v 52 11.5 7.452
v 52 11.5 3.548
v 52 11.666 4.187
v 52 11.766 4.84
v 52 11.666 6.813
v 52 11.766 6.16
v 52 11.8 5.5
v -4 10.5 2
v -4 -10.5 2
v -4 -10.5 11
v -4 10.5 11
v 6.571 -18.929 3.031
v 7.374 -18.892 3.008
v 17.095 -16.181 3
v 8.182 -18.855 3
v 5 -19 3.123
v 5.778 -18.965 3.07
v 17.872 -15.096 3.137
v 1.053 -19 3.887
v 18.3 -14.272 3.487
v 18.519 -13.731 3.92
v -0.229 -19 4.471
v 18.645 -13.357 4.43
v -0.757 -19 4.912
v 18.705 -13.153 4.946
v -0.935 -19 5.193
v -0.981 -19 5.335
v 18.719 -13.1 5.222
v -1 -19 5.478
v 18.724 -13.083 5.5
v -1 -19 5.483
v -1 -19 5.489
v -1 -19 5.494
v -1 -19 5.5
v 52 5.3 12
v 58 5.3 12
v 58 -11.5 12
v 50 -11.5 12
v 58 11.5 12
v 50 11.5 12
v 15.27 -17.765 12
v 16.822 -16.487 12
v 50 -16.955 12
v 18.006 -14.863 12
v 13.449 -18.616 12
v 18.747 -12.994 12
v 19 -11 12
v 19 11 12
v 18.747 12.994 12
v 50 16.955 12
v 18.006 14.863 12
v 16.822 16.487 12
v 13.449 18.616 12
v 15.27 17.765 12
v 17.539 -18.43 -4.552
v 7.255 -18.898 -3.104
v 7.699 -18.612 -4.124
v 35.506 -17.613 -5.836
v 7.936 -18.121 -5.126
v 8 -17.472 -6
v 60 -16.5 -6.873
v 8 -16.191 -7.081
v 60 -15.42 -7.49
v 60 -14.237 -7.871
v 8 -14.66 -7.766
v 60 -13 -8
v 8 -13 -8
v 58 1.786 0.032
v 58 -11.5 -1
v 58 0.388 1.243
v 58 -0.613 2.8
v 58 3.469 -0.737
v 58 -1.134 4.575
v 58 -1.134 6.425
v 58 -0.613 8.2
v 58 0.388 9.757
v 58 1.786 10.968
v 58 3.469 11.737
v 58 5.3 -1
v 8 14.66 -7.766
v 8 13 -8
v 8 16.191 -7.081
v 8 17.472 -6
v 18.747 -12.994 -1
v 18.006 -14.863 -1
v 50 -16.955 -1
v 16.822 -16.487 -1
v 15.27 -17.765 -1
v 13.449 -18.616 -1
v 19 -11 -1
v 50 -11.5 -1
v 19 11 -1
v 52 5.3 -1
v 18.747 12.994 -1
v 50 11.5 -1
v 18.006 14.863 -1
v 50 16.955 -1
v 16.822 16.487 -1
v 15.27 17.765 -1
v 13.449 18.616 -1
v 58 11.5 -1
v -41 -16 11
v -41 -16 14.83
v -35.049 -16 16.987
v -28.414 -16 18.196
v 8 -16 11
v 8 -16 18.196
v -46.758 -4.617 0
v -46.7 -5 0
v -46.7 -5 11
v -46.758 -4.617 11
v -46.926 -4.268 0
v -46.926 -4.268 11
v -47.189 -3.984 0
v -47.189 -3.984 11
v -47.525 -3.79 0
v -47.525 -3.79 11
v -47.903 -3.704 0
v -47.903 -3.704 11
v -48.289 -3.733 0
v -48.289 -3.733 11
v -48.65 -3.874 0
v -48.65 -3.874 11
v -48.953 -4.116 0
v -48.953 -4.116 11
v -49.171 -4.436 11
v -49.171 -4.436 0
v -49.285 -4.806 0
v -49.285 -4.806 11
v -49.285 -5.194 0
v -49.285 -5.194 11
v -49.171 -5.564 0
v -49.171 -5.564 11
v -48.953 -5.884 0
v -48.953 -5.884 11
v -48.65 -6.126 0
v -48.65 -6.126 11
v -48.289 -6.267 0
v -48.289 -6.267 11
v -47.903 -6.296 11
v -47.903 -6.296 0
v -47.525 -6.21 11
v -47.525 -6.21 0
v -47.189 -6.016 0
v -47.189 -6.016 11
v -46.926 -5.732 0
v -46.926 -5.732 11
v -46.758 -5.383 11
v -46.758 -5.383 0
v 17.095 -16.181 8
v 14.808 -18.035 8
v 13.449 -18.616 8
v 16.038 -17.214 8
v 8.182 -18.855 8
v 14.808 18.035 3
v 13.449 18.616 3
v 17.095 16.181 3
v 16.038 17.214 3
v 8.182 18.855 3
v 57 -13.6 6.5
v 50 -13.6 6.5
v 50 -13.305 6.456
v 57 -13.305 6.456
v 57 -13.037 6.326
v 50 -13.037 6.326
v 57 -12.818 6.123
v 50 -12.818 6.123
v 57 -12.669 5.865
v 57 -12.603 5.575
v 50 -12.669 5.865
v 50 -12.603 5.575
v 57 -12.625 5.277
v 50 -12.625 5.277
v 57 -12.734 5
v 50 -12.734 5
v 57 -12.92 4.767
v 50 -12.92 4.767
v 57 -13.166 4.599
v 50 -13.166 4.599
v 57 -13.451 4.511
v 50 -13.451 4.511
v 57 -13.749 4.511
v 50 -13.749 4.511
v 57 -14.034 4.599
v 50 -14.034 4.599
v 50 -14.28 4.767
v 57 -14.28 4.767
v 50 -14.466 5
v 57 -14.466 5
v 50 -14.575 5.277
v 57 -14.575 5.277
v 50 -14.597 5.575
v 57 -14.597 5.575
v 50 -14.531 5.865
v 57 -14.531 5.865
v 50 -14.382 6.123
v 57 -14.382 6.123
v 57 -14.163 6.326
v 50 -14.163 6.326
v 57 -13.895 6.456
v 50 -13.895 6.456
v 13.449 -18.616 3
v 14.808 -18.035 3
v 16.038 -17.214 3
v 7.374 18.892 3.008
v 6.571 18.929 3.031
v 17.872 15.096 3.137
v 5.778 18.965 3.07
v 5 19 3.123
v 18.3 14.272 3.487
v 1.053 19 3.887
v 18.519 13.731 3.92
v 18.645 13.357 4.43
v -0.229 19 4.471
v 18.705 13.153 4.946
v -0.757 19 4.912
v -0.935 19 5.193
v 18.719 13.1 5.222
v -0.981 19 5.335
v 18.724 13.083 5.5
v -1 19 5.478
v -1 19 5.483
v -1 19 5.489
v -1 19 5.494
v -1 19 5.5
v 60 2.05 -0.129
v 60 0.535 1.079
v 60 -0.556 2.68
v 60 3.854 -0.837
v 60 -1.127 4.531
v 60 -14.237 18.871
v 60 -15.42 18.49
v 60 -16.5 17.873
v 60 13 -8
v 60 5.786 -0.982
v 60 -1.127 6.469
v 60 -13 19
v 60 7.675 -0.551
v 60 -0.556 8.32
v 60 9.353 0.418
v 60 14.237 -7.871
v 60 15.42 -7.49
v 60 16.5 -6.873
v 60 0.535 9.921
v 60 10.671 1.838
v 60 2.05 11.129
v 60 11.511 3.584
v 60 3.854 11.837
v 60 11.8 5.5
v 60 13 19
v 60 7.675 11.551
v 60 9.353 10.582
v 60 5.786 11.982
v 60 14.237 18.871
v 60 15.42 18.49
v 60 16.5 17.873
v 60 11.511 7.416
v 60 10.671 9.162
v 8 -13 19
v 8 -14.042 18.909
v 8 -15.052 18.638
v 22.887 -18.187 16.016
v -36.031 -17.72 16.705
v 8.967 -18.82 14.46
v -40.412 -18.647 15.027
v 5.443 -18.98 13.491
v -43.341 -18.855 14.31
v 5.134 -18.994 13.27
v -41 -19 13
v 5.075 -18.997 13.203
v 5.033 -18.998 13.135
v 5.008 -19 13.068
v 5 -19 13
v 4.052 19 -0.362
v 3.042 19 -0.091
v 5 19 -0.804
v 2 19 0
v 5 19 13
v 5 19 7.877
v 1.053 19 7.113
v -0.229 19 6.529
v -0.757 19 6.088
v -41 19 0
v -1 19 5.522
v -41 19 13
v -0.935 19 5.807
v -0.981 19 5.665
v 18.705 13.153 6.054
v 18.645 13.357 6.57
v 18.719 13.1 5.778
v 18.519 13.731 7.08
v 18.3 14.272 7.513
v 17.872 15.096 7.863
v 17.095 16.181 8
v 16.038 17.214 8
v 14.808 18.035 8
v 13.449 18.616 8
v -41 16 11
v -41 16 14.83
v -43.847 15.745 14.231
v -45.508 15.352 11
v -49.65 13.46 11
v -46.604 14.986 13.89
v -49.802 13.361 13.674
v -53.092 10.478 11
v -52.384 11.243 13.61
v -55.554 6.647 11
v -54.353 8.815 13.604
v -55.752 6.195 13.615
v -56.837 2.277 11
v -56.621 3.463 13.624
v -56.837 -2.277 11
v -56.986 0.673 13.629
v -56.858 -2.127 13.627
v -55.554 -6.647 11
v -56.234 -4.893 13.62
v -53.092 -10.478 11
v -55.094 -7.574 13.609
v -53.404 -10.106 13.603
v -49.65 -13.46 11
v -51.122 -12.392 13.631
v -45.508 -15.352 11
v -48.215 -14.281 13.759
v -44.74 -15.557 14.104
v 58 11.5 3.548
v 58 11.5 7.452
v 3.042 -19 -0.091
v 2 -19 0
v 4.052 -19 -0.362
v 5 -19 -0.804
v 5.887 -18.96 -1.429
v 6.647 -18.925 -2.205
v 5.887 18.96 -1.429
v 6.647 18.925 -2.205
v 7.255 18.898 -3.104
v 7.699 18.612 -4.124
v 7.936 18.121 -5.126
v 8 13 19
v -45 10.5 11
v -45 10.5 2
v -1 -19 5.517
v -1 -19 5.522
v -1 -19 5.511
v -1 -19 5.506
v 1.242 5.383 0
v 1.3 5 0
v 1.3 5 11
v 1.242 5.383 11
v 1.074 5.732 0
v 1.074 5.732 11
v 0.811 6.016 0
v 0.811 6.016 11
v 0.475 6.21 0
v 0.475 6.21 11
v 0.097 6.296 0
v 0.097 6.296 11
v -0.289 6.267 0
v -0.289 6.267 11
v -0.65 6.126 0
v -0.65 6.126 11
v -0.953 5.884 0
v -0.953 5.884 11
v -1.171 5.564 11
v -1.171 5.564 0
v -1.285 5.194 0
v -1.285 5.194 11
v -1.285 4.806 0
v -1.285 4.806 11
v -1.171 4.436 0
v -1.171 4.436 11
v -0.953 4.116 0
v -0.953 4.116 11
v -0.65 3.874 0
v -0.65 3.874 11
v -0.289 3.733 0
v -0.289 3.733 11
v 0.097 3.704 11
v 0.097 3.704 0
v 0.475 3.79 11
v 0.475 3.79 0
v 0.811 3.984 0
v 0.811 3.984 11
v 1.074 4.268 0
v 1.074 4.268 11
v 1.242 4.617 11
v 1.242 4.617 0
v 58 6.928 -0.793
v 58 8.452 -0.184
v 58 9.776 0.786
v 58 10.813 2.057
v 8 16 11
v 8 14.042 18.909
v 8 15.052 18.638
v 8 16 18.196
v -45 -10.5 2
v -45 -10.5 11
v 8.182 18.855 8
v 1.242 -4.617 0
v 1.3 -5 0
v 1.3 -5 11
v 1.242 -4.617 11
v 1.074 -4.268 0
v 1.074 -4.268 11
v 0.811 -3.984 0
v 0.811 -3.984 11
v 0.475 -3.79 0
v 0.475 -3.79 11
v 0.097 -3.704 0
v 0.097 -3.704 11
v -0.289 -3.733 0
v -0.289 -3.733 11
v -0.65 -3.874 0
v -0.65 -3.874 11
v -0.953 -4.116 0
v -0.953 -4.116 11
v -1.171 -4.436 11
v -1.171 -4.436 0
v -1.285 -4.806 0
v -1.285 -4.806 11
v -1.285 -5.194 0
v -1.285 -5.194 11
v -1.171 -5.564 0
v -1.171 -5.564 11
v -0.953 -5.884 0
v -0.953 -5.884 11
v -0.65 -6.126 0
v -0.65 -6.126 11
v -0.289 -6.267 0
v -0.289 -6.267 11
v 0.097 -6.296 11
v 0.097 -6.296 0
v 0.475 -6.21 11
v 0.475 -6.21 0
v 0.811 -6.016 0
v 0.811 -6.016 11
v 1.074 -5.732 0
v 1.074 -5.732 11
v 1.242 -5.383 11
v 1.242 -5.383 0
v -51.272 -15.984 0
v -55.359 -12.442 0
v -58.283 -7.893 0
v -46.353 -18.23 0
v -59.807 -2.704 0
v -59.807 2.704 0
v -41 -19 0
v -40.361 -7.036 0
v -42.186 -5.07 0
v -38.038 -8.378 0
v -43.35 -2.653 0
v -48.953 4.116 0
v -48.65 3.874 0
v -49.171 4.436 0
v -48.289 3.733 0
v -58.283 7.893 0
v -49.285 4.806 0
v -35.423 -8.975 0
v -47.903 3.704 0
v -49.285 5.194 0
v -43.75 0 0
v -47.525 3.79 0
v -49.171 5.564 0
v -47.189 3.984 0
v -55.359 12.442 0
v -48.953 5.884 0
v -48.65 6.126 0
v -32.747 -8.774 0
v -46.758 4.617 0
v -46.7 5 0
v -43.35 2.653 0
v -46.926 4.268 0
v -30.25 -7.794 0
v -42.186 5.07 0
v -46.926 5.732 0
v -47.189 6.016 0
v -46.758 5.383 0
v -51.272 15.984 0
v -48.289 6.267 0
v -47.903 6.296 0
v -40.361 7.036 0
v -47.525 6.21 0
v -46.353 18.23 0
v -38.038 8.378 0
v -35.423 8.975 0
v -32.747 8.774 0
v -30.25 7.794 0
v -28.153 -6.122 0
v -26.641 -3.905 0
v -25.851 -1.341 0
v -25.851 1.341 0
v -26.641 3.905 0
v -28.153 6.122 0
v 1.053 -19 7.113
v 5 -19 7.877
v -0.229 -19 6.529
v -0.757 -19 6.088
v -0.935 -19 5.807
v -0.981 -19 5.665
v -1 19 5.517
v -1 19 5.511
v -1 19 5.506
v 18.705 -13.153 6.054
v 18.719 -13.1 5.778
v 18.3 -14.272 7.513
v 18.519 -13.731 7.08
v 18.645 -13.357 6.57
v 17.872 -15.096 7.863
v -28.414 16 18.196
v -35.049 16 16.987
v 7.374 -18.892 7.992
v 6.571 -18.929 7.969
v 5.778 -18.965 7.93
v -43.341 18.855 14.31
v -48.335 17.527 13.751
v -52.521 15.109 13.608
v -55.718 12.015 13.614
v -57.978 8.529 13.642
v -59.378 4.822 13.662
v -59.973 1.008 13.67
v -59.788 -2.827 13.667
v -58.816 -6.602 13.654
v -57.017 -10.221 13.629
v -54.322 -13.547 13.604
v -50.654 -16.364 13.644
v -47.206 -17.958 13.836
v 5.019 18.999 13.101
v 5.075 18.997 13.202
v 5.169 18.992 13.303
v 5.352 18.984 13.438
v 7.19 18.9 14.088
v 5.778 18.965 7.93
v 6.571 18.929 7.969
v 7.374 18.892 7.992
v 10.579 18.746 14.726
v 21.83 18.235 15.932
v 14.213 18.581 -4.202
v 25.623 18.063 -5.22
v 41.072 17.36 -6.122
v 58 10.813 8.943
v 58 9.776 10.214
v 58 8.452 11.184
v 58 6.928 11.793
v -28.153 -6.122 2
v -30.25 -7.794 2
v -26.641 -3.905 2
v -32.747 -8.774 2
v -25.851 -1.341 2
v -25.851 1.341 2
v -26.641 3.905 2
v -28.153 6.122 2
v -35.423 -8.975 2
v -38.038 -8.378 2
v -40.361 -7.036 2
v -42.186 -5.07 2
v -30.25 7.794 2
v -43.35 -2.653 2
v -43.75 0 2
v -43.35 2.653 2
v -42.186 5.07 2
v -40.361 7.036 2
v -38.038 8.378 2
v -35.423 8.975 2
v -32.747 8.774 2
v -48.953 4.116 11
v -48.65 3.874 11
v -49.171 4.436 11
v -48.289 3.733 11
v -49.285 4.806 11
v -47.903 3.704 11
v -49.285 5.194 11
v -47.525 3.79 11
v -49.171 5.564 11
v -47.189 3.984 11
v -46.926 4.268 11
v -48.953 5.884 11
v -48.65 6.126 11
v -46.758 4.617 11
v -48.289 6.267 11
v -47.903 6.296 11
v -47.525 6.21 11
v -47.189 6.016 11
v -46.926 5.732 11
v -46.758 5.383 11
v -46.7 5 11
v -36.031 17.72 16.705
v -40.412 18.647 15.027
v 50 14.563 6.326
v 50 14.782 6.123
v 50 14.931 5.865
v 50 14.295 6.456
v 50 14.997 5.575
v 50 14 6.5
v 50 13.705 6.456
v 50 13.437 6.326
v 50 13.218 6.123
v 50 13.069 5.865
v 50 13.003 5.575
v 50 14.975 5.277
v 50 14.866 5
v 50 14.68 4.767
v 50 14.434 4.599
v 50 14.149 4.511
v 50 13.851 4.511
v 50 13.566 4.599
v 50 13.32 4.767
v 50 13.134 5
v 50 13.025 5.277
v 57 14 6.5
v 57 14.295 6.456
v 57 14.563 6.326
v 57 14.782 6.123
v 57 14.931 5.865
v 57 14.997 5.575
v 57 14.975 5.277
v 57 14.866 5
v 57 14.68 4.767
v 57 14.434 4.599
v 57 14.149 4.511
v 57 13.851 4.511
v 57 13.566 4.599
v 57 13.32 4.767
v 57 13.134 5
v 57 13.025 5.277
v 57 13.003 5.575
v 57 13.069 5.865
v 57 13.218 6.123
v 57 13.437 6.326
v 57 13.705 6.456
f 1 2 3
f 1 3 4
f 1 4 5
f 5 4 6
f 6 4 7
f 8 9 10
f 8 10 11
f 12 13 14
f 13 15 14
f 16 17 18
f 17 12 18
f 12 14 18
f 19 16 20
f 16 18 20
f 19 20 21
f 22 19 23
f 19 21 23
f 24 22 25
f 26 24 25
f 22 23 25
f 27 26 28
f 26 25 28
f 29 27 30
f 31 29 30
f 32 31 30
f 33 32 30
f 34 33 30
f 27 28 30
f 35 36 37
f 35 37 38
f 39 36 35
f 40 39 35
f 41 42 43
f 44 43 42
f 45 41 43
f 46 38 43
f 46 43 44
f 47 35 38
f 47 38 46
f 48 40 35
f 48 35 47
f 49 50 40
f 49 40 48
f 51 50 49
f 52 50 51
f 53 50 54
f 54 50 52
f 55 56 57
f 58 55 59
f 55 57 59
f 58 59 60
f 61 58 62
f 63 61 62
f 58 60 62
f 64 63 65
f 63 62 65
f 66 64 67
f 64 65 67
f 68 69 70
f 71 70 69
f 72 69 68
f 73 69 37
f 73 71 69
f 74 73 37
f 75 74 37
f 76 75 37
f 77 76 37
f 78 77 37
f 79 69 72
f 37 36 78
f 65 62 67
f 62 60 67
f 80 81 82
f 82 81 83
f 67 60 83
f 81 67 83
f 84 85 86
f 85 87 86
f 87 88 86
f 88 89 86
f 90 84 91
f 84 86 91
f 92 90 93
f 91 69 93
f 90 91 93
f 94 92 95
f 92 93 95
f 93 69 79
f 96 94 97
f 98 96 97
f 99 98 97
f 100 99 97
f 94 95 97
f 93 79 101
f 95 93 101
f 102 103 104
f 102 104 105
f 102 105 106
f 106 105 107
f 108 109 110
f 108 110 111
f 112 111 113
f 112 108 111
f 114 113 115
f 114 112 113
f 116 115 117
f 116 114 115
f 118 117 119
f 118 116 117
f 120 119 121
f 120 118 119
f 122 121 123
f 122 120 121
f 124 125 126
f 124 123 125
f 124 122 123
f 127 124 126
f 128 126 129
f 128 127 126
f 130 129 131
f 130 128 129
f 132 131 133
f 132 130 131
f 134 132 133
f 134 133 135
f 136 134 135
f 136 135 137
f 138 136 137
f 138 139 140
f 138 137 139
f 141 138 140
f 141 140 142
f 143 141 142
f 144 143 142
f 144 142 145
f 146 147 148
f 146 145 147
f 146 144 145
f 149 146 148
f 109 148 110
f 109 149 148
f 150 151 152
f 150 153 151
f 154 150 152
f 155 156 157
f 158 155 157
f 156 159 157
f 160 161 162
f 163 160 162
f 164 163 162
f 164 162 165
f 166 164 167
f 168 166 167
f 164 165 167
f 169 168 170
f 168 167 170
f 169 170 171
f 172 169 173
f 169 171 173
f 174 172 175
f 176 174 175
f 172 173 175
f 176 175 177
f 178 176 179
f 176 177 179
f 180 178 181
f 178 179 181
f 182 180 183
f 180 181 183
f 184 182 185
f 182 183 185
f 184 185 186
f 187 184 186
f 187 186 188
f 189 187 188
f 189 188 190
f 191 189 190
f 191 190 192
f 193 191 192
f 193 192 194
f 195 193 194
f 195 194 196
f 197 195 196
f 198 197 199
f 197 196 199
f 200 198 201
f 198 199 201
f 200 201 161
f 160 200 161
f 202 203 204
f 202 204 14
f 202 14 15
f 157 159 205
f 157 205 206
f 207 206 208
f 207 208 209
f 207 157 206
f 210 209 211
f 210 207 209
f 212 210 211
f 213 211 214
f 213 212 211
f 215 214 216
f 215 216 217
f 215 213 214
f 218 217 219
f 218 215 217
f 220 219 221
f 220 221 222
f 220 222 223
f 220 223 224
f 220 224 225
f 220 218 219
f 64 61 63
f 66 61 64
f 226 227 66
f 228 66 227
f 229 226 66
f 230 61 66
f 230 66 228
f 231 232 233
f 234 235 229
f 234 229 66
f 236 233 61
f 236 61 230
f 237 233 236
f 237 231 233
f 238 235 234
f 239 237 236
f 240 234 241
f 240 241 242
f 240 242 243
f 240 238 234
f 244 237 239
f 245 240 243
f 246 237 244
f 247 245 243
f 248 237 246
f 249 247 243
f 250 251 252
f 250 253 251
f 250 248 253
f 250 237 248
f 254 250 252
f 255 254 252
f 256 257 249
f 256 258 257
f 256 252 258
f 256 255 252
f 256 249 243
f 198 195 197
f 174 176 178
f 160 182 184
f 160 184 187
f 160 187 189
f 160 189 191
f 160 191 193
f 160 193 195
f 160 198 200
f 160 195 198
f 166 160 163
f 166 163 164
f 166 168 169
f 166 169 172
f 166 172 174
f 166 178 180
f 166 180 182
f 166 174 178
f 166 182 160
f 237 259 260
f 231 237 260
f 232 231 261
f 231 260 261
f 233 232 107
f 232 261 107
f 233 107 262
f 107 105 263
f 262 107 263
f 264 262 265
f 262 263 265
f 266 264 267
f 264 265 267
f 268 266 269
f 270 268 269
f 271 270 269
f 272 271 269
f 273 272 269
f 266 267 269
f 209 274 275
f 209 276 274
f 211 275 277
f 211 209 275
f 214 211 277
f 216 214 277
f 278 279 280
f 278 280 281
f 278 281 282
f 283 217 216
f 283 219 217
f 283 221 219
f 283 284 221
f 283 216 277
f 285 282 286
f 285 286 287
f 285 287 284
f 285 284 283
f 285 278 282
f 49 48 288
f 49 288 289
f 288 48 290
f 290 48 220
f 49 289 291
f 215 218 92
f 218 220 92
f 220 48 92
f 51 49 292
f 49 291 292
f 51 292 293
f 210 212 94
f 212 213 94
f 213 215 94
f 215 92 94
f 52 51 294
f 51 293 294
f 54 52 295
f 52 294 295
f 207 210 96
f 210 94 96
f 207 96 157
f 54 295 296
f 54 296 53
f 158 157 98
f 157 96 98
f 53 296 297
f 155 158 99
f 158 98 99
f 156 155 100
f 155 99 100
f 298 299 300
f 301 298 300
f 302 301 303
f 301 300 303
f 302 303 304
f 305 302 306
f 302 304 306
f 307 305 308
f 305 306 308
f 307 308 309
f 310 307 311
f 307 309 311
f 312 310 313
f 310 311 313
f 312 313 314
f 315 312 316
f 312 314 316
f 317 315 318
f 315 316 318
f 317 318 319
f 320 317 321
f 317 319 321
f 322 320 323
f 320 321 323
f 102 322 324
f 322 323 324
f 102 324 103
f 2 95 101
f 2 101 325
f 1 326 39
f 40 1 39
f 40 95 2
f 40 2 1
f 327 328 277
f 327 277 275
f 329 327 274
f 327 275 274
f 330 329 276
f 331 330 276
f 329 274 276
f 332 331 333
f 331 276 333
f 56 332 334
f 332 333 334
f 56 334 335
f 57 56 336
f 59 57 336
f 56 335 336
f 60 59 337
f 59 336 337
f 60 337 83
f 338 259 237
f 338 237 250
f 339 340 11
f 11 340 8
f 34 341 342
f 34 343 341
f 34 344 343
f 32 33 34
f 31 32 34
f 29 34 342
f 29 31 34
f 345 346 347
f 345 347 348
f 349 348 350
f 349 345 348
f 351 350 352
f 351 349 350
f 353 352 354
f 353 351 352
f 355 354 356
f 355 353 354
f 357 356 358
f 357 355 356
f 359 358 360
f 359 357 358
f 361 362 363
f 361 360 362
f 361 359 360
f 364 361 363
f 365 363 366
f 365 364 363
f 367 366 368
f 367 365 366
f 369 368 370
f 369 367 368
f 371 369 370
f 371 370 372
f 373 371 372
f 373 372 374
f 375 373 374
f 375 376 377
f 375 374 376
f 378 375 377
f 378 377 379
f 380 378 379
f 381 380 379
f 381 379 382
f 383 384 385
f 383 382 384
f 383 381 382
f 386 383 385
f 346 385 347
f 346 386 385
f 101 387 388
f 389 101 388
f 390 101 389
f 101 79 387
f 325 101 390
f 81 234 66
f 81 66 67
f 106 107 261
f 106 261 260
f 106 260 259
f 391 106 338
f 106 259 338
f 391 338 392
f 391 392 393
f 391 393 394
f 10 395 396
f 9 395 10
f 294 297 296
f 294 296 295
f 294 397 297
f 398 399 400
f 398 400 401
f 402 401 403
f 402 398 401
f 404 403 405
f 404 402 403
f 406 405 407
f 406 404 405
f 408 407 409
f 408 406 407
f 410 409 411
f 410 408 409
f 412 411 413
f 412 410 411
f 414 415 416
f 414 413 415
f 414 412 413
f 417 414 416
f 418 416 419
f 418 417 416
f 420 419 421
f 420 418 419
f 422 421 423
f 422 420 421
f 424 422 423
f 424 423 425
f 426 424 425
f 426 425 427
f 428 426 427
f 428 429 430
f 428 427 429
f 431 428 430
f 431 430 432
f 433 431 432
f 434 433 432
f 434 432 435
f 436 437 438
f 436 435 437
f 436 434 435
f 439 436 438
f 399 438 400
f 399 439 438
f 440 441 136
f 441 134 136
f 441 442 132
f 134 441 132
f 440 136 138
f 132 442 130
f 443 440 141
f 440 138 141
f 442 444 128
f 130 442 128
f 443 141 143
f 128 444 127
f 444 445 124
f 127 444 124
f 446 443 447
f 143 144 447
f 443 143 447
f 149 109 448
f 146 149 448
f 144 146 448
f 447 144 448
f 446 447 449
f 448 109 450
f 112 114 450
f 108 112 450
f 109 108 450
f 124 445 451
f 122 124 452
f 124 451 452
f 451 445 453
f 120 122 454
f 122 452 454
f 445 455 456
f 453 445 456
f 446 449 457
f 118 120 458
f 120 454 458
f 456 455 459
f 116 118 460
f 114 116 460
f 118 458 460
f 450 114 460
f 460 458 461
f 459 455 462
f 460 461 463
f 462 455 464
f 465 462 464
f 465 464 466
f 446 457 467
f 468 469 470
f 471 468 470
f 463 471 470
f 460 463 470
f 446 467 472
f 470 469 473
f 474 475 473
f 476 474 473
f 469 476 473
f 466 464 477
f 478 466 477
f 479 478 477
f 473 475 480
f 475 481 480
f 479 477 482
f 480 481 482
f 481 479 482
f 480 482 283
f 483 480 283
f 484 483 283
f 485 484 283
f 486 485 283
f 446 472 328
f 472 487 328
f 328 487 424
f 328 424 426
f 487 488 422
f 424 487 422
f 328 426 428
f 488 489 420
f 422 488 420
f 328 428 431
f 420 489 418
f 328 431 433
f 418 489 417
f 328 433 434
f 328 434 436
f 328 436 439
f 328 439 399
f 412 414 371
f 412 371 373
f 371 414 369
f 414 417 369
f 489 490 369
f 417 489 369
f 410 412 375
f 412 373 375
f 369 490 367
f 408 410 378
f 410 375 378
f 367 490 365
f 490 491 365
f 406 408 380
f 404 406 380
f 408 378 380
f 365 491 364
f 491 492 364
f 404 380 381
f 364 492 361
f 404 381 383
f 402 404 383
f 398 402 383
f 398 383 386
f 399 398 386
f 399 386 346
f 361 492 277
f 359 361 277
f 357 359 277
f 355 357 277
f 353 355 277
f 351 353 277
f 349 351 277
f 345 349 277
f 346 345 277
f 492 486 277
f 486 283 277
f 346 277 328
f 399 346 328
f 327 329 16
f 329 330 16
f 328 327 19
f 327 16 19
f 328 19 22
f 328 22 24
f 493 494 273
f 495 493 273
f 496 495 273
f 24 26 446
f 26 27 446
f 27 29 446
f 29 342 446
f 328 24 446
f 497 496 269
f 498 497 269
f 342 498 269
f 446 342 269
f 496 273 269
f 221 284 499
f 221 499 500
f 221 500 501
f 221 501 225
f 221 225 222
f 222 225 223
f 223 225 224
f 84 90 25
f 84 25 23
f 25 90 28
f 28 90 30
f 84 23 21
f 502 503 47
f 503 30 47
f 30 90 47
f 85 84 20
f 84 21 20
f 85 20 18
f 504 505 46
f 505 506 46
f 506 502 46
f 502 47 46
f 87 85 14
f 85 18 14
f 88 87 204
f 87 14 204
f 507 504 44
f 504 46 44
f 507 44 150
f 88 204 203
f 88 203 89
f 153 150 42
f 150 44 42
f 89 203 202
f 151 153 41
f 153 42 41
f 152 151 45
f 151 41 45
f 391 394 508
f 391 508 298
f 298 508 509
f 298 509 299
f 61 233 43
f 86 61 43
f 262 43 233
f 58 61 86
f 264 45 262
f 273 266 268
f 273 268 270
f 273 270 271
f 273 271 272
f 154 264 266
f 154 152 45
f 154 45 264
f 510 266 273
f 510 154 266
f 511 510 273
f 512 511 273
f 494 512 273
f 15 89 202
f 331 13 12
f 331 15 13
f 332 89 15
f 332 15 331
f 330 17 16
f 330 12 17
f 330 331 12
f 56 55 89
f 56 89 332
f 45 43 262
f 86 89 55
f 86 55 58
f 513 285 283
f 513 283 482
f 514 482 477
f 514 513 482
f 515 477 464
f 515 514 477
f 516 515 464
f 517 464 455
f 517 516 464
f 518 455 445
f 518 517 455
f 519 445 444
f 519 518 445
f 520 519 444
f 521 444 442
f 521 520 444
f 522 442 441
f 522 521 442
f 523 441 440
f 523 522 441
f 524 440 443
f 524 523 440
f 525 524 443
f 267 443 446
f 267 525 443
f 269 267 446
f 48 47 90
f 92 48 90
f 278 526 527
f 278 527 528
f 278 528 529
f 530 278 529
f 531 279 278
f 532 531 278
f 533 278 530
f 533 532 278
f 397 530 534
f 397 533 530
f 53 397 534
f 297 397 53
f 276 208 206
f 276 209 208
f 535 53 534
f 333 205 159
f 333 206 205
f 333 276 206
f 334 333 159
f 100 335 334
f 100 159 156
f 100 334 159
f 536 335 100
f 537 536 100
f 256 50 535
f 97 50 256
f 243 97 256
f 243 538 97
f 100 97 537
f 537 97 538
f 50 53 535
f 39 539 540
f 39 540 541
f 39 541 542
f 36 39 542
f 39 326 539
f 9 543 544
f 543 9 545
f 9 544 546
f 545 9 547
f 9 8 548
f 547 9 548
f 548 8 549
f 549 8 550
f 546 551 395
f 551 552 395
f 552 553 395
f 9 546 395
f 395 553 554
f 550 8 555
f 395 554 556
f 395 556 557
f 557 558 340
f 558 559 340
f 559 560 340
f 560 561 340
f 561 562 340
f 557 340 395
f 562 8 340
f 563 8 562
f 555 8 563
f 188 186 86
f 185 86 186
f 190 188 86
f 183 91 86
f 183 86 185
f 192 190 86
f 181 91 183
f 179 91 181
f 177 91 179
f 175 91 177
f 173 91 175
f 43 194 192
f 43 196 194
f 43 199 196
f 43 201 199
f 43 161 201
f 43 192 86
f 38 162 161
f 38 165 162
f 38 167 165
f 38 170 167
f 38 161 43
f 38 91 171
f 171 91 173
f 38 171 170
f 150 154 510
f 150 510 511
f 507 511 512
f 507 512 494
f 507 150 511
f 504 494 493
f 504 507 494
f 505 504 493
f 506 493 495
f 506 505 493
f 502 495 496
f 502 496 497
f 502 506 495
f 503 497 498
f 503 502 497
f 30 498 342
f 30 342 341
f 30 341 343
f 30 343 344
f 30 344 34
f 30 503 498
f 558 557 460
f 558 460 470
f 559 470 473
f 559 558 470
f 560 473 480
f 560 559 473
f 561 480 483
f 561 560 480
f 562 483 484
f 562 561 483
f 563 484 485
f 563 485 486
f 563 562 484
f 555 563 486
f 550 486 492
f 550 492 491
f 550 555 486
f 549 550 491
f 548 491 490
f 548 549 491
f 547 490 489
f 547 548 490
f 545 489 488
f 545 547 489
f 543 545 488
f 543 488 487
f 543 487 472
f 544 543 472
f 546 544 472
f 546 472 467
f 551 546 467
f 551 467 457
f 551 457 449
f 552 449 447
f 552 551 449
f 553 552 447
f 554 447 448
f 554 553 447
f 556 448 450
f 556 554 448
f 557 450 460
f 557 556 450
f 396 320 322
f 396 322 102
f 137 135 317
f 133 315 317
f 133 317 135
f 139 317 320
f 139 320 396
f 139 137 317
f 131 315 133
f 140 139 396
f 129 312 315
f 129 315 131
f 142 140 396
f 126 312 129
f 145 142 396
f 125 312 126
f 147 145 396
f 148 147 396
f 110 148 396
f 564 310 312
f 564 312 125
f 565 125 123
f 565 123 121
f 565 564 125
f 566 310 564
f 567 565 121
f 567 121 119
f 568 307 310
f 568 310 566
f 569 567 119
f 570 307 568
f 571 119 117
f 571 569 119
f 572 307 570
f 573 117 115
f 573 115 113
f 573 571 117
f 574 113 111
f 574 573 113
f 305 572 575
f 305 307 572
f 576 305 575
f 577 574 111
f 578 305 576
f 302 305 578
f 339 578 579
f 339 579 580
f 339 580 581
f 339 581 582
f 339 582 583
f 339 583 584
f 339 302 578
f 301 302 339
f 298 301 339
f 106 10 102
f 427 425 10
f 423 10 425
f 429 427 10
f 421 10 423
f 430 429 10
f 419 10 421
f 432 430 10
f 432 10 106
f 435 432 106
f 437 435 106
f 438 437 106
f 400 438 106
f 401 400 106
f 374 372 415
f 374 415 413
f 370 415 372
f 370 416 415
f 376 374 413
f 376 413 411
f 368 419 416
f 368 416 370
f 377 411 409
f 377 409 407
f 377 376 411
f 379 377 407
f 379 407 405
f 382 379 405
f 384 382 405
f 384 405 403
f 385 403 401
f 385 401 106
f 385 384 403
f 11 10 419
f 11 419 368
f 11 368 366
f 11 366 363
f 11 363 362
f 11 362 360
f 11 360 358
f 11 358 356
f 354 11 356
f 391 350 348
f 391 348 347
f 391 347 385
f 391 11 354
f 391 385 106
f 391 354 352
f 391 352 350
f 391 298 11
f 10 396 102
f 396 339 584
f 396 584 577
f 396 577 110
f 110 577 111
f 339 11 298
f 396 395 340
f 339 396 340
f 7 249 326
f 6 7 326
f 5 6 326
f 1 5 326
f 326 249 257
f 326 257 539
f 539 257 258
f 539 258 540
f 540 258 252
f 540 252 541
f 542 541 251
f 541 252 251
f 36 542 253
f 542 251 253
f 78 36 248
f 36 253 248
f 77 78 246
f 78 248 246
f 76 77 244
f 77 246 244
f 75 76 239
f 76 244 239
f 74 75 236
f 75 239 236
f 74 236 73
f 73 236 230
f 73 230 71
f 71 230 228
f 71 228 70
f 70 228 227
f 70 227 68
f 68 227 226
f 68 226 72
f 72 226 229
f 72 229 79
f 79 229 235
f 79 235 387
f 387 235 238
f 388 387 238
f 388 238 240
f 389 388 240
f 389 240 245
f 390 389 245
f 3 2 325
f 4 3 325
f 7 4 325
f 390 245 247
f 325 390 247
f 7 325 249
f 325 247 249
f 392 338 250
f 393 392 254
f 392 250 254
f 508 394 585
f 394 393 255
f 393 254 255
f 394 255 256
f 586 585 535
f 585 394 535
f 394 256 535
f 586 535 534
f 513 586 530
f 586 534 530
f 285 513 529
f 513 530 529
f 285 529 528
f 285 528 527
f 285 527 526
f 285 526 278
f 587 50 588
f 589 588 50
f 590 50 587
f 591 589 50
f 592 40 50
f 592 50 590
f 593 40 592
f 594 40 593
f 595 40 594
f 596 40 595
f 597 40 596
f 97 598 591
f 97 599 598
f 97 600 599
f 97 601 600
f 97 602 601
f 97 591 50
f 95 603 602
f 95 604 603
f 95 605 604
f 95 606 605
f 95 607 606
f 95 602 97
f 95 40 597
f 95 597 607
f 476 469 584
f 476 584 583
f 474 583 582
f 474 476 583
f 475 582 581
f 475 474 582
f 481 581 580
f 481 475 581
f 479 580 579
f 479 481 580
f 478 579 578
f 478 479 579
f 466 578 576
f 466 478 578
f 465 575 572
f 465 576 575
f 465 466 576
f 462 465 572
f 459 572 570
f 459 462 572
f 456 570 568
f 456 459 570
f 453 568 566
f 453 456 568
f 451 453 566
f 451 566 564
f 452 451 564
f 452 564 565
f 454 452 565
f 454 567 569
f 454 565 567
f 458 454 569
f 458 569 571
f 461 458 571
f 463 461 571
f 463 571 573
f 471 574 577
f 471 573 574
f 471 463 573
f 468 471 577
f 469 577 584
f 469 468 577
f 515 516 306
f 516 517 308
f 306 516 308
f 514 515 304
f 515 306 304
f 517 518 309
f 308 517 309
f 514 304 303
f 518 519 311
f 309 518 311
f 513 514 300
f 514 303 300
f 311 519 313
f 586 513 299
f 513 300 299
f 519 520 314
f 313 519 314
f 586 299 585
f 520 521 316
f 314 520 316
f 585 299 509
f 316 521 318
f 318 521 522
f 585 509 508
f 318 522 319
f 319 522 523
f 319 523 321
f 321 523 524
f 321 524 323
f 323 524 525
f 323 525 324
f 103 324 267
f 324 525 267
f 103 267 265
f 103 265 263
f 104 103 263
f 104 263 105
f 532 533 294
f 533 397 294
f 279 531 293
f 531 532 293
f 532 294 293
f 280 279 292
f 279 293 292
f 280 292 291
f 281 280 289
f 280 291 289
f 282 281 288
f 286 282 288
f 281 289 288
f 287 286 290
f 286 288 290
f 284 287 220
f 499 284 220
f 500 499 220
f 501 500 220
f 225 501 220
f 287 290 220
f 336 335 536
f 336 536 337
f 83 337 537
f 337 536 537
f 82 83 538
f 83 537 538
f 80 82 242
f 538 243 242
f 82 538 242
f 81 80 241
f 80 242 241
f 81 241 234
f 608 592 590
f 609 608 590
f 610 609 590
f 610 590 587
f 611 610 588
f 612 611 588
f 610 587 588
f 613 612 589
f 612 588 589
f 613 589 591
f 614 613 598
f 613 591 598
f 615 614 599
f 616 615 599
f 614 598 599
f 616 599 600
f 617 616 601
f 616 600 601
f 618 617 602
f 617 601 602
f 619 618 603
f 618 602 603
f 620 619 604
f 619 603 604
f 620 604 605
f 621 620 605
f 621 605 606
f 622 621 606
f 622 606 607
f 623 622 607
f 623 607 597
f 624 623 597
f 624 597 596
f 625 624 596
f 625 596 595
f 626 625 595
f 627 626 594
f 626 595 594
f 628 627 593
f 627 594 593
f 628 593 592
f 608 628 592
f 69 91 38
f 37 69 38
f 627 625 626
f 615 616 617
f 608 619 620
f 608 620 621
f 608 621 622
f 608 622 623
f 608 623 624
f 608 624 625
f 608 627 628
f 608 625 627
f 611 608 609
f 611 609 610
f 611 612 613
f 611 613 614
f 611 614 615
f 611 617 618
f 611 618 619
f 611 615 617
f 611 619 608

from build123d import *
from OCP.BRepFilletAPI import BRepFilletAPI_MakeChamfer

# Parameters (mm, degrees)
SKETCH1_W               = 120
SKETCH1_H               = 38
SKETCH1_W_2             = 41
SKETCH1_H_2             = 21
BOSS_EXTRUDE1_DEPTH     = 11
SKETCH2_R               = 1.3
CUT_EXTRUDE1_DEPTH      = 8
FILLET1_RADIUS          = 19
FILLET1_LENGTH          = 11
BOSS_EXTRUDE2_START     = 8
BOSS_EXTRUDE2_DEPTH     = 8
FILLET2_R               = 16
CUT_EXTRUDE2_DEPTH      = 66.741919656
CUT_EXTRUDE2_DEPTH_BACK = 66.741919656
BOSS_EXTRUDE3_START     = 8
BOSS_EXTRUDE3_OUTLINE_W = 32
BOSS_EXTRUDE3_OUTLINE_H = 8
BOSS_EXTRUDE3_DEPTH     = 49
SKETCH6_W               = 52
SKETCH6_H               = 38
BOSS_EXTRUDE4_DEPTH     = 8
CUT_EXTRUDE3_DEPTH      = 74.518705262
CUT_EXTRUDE3_DEPTH_BACK = 74.518705262
SKETCH7_W               = 31
SKETCH7_H               = 13
SKETCH8_W               = 13
SKETCH8_H               = 23
CUT_EXTRUDE4_DEPTH      = 8
BOSS_EXTRUDE5_START     = -2
SKETCH9_R               = 9
BOSS_EXTRUDE5_DEPTH     = 2
SKETCH10_R              = 6.5
CUT_EXTRUDE5_DEPTH      = 8
SKETCH12_W              = 5
SKETCH12_H              = 6
CUT_EXTRUDE6_DEPTH      = 20
CHAMFER1_SIZE           = 6
CHAMFER1_SIZE_2         = 20
FILLET3_R               = 8
FILLET4_R               = 6
FILLET5_R               = 6
FILLET6_R               = 2.5
SKETCH13_R              = 1.1
CUT_EXTRUDE7_DEPTH      = 8
CUT_EXTRUDE8_DEPTH      = 69.483574828
CUT_EXTRUDE8_DEPTH_BACK = 69.483574828
CUT_EXTRUDE9_DEPTH      = 66.741919805
CUT_EXTRUDE9_DEPTH_BACK = 66.741919805
SKETCH15_R              = 1.3
SKETCH16_R              = 1.1
BOSS_EXTRUDE6_DEPTH     = 8
SKETCH17_R              = 1
CUT_EXTRUDE10_DEPTH     = 7


# Read off the part's stored shape, not the designer's step: Boss-Extrude3
# Some blends are built 0.0001 mm under size
with BuildPart() as part:
    # Sketch1 → Boss-Extrude1 (new body)
    with BuildSketch(Plane.XY):
        Rectangle(SKETCH1_W, SKETCH1_H)
        with Locations((-24.5, 0)):
            Rectangle(SKETCH1_W_2, SKETCH1_H_2, mode=Mode.SUBTRACT)
    extrude(amount=BOSS_EXTRUDE1_DEPTH)

    # Sketch2 → Cut-Extrude1 (cut)
    with BuildSketch(Plane.XY.offset(1)):
        with Locations((0, 5)):
            Circle(SKETCH2_R)
        with Locations((-48, 5)):
            Circle(SKETCH2_R)
        with Locations((-48, -5)):
            Circle(SKETCH2_R)
        with Locations((0, -5)):
            Circle(SKETCH2_R)
    extrude(amount=CUT_EXTRUDE1_DEPTH, mode=Mode.SUBTRACT)

    # Fillet1: full round fillet: the end face becomes a half cylinder, R = half its width
    fillet1_face = Plane((-60, 0, 5.5), x_dir=(0, 0, 1), z_dir=(-1, 0, 0))  # on the end face: x along it, z out of the body
    fillet1_slab = fillet1_face.offset(-FILLET1_RADIUS / 2) * Box(FILLET1_LENGTH, 2 * FILLET1_RADIUS, FILLET1_RADIUS, mode=Mode.PRIVATE)  # the body's end, R deep
    fillet1_round = Plane((-41, 0, 5.5), x_dir=(-1, 0, 0), z_dir=(0, 0, 1)) * Cylinder(FILLET1_RADIUS, FILLET1_LENGTH, mode=Mode.PRIVATE)  # its axis R under the face
    add(fillet1_slab - fillet1_round, mode=Mode.SUBTRACT)

    # Sketch3 → Boss-Extrude2 (add)
    with BuildSketch(Plane.XY.offset(11).offset(BOSS_EXTRUDE2_START)):
        with BuildLine():
            Line((60, 19), (-41, 19))
            ThreePointArc((-41, 19), (-60, 0), (-41, -19))
            Line((-41, -19), (60, -19))
            Line((60, -19), (60, 19))
        make_face()
        with BuildLine():
            Line((57, 16), (-41, 16))
            ThreePointArc((-41, 16), (-57, 0), (-41, -16))
            Line((-41, -16), (57, -16))
            Line((57, -16), (57, 16))
        make_face(mode=Mode.SUBTRACT)
    extrude(amount=-BOSS_EXTRUDE2_DEPTH)

    # Fillet2
    fillet2_edges = [part.edges().sort_by_distance(p)[0] for p in [
        (57, 16, 15),
        (57, -16, 15),
    ]]
    fillet(fillet2_edges, radius=FILLET2_R - 0.0001)  # a hair under: the kernel refuses the full size

    # Sketch4 → Cut-Extrude2 (cut, two sides: drawn at the far end of the back side and taken through both)
    with BuildSketch(Plane(origin=(0, 0, 0), x_dir=(1, 0, 0), z_dir=(0, 1, 0)).offset(-CUT_EXTRUDE2_DEPTH_BACK)):
        with BuildLine():
            Line((-60, -13.67), (-60, -19))
            Line((-60, -19), (-20, -19))
            add(Edge.make_bspline(
                [(-60, -13.67), (-53.560147586, -13.588290525), (-48.332037755, -13.416667168), (-40.159488654, -14.861068215), (-37.804599967, -16.297682364), (-29.745918458, -18.344163696), (-24.82962643, -18.478671578), (-20, -19)],
                knots=[0, 0, 0, 0, 0.436512255, 0.505229669, 0.666958087, 0.718456725, 1, 1, 1, 1], degree=3))
        make_face()
    extrude(amount=CUT_EXTRUDE2_DEPTH + CUT_EXTRUDE2_DEPTH_BACK, mode=Mode.SUBTRACT)

    # Boss-Extrude3 outline → Boss-Extrude3 (add)
    with BuildSketch(Plane.YZ.offset(BOSS_EXTRUDE3_START)):
        with Locations((0, 15)):
            Rectangle(BOSS_EXTRUDE3_OUTLINE_W, BOSS_EXTRUDE3_OUTLINE_H)
    extrude(amount=BOSS_EXTRUDE3_DEPTH)

    # Sketch6 → Boss-Extrude4 (add)
    with BuildSketch(Plane(origin=(0, 0, 0), x_dir=(-1, 0, 0), z_dir=(0, 0, -1))):
        with Locations((-34, 0)):
            Rectangle(SKETCH6_W, SKETCH6_H)
    extrude(amount=BOSS_EXTRUDE4_DEPTH)

    # Sketch7 → Cut-Extrude3 (cut, two sides: drawn at the far end of the back side and taken through both)
    with BuildSketch(Plane(origin=(0, 19, 0), x_dir=(1, 0, 0), z_dir=(0, 1, 0)).offset(-CUT_EXTRUDE3_DEPTH_BACK)):
        with Locations((34.5, -5.5)):
            Rectangle(SKETCH7_W, SKETCH7_H)
    extrude(amount=CUT_EXTRUDE3_DEPTH + CUT_EXTRUDE3_DEPTH_BACK, mode=Mode.SUBTRACT)

    # Sketch8 → Cut-Extrude4 (cut)
    with BuildSketch(Plane.ZY.offset(-50)):
        with Locations((5.5, 0)):
            Rectangle(SKETCH8_W, SKETCH8_H)
    extrude(amount=-CUT_EXTRUDE4_DEPTH, mode=Mode.SUBTRACT)

    # Sketch9 → Boss-Extrude5 (add)
    with BuildSketch(Plane(origin=(0, 0, 0), x_dir=(-1, 0, 0), z_dir=(0, 0, -1)).offset(BOSS_EXTRUDE5_START)):
        with BuildLine():
            Line((-8, 19), (-8, -19))
            Line((-8, -19), (41, -19))
            ThreePointArc((41, -19), (60, 0), (41, 19))
            Line((41, 19), (-8, 19))
        make_face()
        with Locations((34.75, 0)):
            Circle(SKETCH9_R, mode=Mode.SUBTRACT)
    extrude(amount=BOSS_EXTRUDE5_DEPTH)

    # Sketch10 → Cut-Extrude5 (cut)
    with BuildSketch(Plane(origin=(60, 0, 0), x_dir=(0, 0, -1), z_dir=(1, 0, 0))):
        with Locations(Location((-5.5, 5.3, 0), (0, 0, 90))):
            Circle(SKETCH10_R)
    extrude(amount=-CUT_EXTRUDE5_DEPTH, mode=Mode.SUBTRACT)

    # Sketch12 → Cut-Extrude6 (cut)
    with BuildSketch(Plane(origin=(19, 0, 0), x_dir=(0, 0, -1), z_dir=(1, 0, 0))):
        with Locations((-5.5, 16)):
            Rectangle(SKETCH12_W, SKETCH12_H)
        with Locations((-5.5, -16)):
            Rectangle(SKETCH12_W, SKETCH12_H)
    extrude(amount=-CUT_EXTRUDE6_DEPTH, mode=Mode.SUBTRACT)

    # Chamfer1
    chamfer1_edges_1 = [part.edges().sort_by_distance(p)[0] for p in [
        (-1, -13, 5.5),
    ]]
    chamfer1_side_1 = [part.faces().sort_by_distance(p)[0] for p in [
        (-1, -13.12, 5.5),
    ]]
    chamfer1_edges_2 = [part.edges().sort_by_distance(p)[0] for p in [
        (-1, 13, 5.5),
    ]]
    chamfer1_side_2 = [part.faces().sort_by_distance(p)[0] for p in [
        (-1, 13.12, 5.5),
    ]]
    chamfer1 = BRepFilletAPI_MakeChamfer(part.part.solid().wrapped)
    for e in chamfer1_edges_1:
        chamfer1.Add(CHAMFER1_SIZE - 0.0001, CHAMFER1_SIZE_2 - 0.0001, e.wrapped, chamfer1_side_1[0].wrapped)
    for e in chamfer1_edges_2:
        chamfer1.Add(CHAMFER1_SIZE - 0.0001, CHAMFER1_SIZE_2 - 0.0001, e.wrapped, chamfer1_side_2[0].wrapped)
    add(Compound.cast(chamfer1.Shape()), mode=Mode.REPLACE)  # a hair under: the kernel refuses the full size

    # Fillet3
    # the kernel refuses this fillet: 8 mm, written as the material it takes off along each edge
    with BuildSketch(Plane(origin=(19, 19, -1), x_dir=(0, -1, 0), z_dir=(0, 0, 1))) as fillet3_piece_1_section:
        with BuildLine():
            CenterArc((FILLET3_R, -FILLET3_R), FILLET3_R, 90, 90)
            Line((0, -FILLET3_R), (0, 0))
            Line((0, 0), (FILLET3_R, 0))
        make_face()
    fillet3_piece_1 = extrude(amount=24, mode=Mode.PRIVATE)
    fillet3_piece_1 = split(fillet3_piece_1, bisect_by=Plane(origin=(18.924002019, 12.501601439, 12), z_dir=(0, 0, -1)), keep=Keep.TOP, mode=Mode.PRIVATE)
    add(fillet3_piece_1, mode=Mode.SUBTRACT)
    with BuildSketch(Plane(origin=(19, -19, 23), x_dir=(0, 1, 0), z_dir=(0, 0, -1))) as fillet3_piece_2_section:
        with BuildLine():
            CenterArc((FILLET3_R, -FILLET3_R), FILLET3_R, 90, 90)
            Line((0, -FILLET3_R), (0, 0))
            Line((0, 0), (FILLET3_R, 0))
        make_face()
    fillet3_piece_2 = extrude(amount=24, mode=Mode.PRIVATE)
    fillet3_piece_2 = split(fillet3_piece_2, bisect_by=Plane(origin=(18.924002019, -12.501601439, 12), z_dir=(0, 0, -1)), keep=Keep.TOP, mode=Mode.PRIVATE)
    add(fillet3_piece_2, mode=Mode.SUBTRACT)

    # Fillet4
    # the kernel refuses this fillet: 6 mm, written as the material it takes off along each edge
    with BuildSketch(Plane(origin=(-28, -19, -8), x_dir=(0, 0, 1), z_dir=(1, 0, 0)), Plane(origin=(96, 19, -8), x_dir=(0, 0, 1), z_dir=(-1, 0, 0))) as fillet4_piece_1:
        with BuildLine():
            CenterArc((FILLET4_R, -FILLET4_R), FILLET4_R, 90, 90)
            Line((0, -FILLET4_R), (-FILLET4_R * 0.02, -FILLET4_R))
            Line((-FILLET4_R * 0.02, -FILLET4_R), (-FILLET4_R * 0.02, FILLET4_R * 0.02))
            Line((-FILLET4_R * 0.02, FILLET4_R * 0.02), (FILLET4_R, FILLET4_R * 0.02))
            Line((FILLET4_R, FILLET4_R * 0.02), (FILLET4_R, 0))
        make_face()
    extrude(amount=124, mode=Mode.SUBTRACT)
    with BuildSketch(Plane(origin=(96, 19, 19), x_dir=(0, 0, -1), z_dir=(-1, 0, 0)), Plane(origin=(-56, -19, 19), x_dir=(0, 0, -1), z_dir=(1, 0, 0))) as fillet4_piece_2:
        with BuildLine():
            CenterArc((FILLET4_R, FILLET4_R), FILLET4_R, 180, 90)
            Line((0, FILLET4_R), (-FILLET4_R * 0.02, FILLET4_R))
            Line((-FILLET4_R * 0.02, FILLET4_R), (-FILLET4_R * 0.02, -FILLET4_R * 0.02))
            Line((-FILLET4_R * 0.02, -FILLET4_R * 0.02), (FILLET4_R, -FILLET4_R * 0.02))
            Line((FILLET4_R, -FILLET4_R * 0.02), (FILLET4_R, 0))
        make_face()
    extrude(amount=152, mode=Mode.SUBTRACT)

    # Fillet5
    fillet5_edges = [part.edges().sort_by_distance(p)[0] for p in [
        (8, 0, 0),
    ]]
    fillet(fillet5_edges, radius=FILLET5_R)

    # Fillet6
    fillet6_edges = [part.edges().sort_by_distance(p)[0] for p in [
        (8.862066808, 16.041314475, 3),
        (8.862066808, 16.041314475, 8),
        (8.862066808, -16.041314475, 8),
        (8.862066808, -16.041314475, 3),
    ]]
    fillet(fillet6_edges, radius=FILLET6_R - 0.0001)  # a hair under: the kernel refuses the full size

    # Sketch13 → Cut-Extrude7 (cut)
    with BuildSketch(Plane.ZY.offset(-50)):
        with Locations((6.5, 13.8)):
            Circle(SKETCH13_R)
        with Locations((6.5, -13.8)):
            Circle(SKETCH13_R)
    extrude(amount=-CUT_EXTRUDE7_DEPTH, mode=Mode.SUBTRACT)

    # Sketch14 → Cut-Extrude8 (cut, two sides: drawn at the far end of the back side and taken through both)
    with BuildSketch(Plane.XY.offset(19).offset(-CUT_EXTRUDE8_DEPTH_BACK)):
        Polygon((5, 19), (60, 16.5), (60, 19), align=None)
        Polygon((60, -19), (60, -16.5), (5, -19), align=None)
    extrude(amount=CUT_EXTRUDE8_DEPTH + CUT_EXTRUDE8_DEPTH_BACK, mode=Mode.SUBTRACT)

    # Sketch15 → Cut-Extrude9 (cut, two sides: drawn at the far end of the back side and taken through both)
    with BuildSketch(Plane.XY.offset(11).offset(-CUT_EXTRUDE9_DEPTH_BACK)):
        with Locations((0, -5)):
            Circle(SKETCH15_R)
        with Locations((-48, -5)):
            Circle(SKETCH15_R)
        with Locations((-48, 5)):
            Circle(SKETCH15_R)
        with Locations((0, 5)):
            Circle(SKETCH15_R)
    extrude(amount=CUT_EXTRUDE9_DEPTH + CUT_EXTRUDE9_DEPTH_BACK, mode=Mode.SUBTRACT)

    # Sketch16 → Boss-Extrude6 (add)
    with BuildSketch(Plane.ZY.offset(-50)):
        with Locations((6.5, -13.8)):
            Circle(SKETCH16_R)
        with Locations((6.5, 13.8)):
            Circle(SKETCH16_R)
    extrude(amount=-BOSS_EXTRUDE6_DEPTH)

    # Sketch17 → Cut-Extrude10 (cut)
    with BuildSketch(Plane.ZY.offset(-50)):
        with Locations((5.5, -13.6)):
            Circle(SKETCH17_R)
        with Locations((5.5, 14)):
            Circle(SKETCH17_R)
    extrude(amount=-CUT_EXTRUDE10_DEPTH, mode=Mode.SUBTRACT)


solid = part.part
